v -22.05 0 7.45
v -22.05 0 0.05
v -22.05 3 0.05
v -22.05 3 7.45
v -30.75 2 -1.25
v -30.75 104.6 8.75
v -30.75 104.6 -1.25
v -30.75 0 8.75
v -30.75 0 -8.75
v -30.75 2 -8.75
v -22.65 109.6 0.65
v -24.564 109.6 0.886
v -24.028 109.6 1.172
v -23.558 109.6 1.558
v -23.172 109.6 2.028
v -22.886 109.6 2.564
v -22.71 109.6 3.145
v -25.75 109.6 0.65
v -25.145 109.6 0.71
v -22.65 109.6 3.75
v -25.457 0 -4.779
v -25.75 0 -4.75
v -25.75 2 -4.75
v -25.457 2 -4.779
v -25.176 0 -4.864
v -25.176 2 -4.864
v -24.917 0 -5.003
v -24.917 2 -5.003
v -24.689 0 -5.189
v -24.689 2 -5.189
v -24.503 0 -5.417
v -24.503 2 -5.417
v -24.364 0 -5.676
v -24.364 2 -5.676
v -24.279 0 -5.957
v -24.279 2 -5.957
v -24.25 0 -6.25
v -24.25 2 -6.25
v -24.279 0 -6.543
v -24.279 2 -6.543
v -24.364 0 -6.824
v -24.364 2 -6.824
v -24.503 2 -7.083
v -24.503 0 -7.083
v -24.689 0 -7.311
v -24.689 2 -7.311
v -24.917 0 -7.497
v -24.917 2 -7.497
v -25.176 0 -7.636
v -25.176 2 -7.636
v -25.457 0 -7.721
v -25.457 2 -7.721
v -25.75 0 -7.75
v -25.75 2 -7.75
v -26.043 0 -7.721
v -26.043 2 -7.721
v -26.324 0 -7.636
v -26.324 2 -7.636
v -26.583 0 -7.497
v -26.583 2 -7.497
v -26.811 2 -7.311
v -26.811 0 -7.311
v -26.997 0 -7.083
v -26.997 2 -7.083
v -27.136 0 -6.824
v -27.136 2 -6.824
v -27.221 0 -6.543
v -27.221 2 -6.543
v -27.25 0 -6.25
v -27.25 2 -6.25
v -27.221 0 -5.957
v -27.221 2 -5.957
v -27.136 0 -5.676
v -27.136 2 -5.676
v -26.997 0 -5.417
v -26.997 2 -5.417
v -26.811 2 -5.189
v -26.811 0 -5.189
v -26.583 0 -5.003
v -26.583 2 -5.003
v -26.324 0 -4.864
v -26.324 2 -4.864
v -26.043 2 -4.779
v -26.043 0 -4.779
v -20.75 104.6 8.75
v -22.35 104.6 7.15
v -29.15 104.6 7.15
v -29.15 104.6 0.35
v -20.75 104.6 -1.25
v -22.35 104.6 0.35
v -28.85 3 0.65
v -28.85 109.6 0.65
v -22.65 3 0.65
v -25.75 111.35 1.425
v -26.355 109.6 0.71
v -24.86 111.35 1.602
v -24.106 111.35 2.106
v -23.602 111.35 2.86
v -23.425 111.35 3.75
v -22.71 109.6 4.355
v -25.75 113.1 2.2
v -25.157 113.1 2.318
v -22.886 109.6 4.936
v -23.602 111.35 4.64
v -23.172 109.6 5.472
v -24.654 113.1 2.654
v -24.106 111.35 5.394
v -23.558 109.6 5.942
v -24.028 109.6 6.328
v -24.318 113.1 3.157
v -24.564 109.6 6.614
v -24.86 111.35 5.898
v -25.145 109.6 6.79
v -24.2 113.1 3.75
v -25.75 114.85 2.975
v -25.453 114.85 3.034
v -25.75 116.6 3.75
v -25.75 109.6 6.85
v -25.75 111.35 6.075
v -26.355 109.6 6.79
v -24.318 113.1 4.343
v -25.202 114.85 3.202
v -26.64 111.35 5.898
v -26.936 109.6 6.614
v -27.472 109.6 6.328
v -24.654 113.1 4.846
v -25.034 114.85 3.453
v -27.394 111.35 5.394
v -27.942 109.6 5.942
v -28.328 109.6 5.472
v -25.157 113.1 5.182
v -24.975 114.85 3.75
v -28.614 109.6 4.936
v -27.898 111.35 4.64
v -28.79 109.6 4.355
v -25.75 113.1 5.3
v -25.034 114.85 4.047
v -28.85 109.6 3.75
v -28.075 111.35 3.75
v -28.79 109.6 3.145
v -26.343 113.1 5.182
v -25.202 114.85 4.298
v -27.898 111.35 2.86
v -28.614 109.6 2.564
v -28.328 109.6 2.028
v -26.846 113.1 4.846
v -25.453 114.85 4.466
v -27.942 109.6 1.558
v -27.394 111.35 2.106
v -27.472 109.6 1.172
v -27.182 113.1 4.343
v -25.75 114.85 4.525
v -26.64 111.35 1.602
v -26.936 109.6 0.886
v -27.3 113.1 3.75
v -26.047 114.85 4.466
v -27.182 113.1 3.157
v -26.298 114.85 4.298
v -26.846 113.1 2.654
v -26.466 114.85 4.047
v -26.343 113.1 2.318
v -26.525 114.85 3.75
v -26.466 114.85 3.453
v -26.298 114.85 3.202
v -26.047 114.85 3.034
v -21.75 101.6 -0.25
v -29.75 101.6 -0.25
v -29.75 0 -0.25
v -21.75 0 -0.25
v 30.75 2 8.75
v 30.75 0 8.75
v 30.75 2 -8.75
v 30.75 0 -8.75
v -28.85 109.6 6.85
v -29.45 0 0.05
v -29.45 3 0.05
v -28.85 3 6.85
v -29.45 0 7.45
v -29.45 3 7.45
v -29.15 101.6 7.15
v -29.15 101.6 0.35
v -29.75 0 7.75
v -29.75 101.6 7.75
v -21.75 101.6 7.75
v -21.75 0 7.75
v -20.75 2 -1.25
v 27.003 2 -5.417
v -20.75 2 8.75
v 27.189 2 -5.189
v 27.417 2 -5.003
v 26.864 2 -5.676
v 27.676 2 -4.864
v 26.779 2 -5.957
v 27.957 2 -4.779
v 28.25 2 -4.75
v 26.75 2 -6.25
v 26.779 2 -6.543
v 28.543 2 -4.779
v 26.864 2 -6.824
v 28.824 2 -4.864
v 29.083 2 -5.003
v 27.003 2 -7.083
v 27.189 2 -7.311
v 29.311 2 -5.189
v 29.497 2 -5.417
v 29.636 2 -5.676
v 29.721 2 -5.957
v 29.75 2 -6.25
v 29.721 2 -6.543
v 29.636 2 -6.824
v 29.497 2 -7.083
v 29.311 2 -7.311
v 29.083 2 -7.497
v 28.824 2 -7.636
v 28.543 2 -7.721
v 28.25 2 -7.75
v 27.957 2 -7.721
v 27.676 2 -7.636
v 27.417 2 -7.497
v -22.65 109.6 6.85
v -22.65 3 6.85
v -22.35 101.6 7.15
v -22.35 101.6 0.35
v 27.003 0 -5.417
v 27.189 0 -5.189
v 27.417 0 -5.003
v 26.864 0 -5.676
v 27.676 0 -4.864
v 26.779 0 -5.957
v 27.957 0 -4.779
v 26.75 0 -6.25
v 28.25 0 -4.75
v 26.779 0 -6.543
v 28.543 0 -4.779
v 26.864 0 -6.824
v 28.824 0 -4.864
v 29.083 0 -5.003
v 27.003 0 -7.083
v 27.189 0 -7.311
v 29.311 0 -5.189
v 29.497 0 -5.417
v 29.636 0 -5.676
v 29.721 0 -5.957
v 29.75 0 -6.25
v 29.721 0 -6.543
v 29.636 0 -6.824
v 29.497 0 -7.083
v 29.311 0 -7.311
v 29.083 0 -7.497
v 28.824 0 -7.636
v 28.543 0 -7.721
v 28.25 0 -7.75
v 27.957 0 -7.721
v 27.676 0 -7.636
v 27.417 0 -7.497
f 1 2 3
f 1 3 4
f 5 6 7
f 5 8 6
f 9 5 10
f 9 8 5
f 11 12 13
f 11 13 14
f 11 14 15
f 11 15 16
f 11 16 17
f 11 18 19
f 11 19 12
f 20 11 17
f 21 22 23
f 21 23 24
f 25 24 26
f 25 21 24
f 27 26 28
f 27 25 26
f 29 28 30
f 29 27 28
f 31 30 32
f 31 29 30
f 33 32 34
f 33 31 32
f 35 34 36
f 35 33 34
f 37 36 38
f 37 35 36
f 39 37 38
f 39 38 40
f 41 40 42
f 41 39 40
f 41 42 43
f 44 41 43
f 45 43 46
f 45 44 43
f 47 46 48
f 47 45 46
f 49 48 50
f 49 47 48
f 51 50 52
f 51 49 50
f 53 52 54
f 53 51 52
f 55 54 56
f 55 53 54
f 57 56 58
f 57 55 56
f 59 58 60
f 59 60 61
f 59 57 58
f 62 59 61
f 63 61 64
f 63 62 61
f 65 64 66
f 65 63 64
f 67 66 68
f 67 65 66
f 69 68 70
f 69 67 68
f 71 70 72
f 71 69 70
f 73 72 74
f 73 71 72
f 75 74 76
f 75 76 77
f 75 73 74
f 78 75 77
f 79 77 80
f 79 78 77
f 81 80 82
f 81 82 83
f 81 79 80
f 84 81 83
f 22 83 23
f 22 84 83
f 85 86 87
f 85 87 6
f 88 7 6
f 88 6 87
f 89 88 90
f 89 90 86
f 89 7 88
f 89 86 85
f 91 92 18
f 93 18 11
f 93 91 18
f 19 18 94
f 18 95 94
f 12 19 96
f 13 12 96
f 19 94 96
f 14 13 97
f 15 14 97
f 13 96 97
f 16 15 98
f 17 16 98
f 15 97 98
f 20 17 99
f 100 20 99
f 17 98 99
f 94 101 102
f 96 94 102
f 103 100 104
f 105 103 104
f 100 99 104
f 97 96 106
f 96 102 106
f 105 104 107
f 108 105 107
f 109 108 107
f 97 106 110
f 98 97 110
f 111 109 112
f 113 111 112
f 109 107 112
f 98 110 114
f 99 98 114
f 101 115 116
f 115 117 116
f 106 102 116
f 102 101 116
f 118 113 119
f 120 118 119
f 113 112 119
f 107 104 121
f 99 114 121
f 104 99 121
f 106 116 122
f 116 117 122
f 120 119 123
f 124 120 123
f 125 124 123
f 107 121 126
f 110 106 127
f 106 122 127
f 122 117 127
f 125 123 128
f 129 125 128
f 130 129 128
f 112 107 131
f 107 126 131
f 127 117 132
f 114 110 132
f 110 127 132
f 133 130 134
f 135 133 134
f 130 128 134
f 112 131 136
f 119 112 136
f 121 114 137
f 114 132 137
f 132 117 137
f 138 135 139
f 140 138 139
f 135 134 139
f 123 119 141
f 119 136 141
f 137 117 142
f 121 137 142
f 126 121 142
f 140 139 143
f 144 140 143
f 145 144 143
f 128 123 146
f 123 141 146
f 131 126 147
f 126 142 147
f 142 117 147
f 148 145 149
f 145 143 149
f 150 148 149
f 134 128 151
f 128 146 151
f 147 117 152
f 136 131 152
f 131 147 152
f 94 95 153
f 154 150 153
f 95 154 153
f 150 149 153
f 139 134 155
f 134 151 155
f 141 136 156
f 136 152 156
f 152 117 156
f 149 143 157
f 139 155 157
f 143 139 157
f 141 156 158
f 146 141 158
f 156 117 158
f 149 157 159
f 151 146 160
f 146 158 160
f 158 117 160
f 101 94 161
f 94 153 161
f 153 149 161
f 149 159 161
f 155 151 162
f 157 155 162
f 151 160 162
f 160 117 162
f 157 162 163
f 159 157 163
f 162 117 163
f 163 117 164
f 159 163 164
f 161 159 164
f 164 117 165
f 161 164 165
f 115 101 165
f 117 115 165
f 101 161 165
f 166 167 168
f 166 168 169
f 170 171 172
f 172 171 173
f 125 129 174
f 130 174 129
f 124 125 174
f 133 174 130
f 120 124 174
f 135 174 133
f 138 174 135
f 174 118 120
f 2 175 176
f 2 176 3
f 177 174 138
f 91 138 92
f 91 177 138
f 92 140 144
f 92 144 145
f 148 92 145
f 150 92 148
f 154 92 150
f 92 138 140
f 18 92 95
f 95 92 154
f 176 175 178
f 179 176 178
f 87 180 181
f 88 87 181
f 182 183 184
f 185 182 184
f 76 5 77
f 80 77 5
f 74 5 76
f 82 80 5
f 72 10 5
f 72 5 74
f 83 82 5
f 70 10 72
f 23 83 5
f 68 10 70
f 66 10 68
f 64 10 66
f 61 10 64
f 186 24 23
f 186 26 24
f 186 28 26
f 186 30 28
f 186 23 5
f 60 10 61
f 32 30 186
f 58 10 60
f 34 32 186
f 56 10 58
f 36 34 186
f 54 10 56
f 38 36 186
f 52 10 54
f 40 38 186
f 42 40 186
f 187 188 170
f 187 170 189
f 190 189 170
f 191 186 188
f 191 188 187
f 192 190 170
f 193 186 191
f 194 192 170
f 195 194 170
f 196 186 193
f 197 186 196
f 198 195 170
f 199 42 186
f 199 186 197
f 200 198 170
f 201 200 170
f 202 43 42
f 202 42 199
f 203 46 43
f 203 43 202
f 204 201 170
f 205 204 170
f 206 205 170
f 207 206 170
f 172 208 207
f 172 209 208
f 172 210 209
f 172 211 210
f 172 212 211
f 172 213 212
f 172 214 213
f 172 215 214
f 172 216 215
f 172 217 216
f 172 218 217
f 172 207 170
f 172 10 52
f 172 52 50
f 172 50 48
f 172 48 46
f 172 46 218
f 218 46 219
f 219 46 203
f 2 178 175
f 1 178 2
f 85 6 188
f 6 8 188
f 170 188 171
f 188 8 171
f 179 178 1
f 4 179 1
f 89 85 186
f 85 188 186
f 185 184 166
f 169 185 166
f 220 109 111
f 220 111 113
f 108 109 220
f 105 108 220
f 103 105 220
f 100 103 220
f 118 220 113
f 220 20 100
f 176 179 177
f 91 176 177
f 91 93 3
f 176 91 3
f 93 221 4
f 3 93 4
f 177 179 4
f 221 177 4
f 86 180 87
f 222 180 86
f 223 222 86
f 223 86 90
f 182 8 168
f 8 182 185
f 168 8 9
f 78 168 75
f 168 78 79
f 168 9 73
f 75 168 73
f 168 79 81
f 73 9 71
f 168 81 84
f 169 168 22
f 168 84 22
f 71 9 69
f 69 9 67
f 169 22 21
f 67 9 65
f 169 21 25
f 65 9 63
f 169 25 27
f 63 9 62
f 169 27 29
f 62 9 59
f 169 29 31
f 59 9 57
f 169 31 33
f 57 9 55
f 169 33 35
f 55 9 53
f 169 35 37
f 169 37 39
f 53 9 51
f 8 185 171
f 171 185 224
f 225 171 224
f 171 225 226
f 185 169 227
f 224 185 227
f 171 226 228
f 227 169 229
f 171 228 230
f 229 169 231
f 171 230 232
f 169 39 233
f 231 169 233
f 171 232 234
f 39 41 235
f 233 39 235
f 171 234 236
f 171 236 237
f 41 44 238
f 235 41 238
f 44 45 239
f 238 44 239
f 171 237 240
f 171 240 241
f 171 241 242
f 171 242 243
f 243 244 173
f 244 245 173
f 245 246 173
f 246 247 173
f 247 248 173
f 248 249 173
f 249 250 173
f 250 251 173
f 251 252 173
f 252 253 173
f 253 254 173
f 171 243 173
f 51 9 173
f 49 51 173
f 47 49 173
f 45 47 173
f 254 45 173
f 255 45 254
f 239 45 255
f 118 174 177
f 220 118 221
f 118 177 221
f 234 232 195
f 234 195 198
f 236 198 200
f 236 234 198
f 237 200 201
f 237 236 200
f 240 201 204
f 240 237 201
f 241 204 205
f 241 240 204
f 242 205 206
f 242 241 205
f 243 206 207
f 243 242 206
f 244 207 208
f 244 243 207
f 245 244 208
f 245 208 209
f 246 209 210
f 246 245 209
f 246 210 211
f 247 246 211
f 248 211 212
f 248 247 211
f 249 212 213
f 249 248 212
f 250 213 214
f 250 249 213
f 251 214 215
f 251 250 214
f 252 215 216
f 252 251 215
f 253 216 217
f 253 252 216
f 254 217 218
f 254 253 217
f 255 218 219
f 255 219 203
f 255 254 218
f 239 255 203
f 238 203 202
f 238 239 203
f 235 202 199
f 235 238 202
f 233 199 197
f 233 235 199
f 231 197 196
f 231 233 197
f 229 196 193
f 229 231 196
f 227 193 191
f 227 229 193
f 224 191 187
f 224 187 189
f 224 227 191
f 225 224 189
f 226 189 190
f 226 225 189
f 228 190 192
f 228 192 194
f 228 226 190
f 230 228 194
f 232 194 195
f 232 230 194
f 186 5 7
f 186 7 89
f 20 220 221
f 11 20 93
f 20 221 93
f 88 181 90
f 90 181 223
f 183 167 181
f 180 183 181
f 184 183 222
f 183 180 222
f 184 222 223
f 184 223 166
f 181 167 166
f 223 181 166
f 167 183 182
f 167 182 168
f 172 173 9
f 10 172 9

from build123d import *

# Parameters (mm, degrees)
SKETCH1_R            = 1.5
SKETCH1_W            = 10
SKETCH1_H            = 10
SKETCH1_W_2          = 8
SKETCH1_H_2          = 8
BOSS_EXTRUDE5_DEPTH  = 2
SKETCH1_5_W          = 10
SKETCH1_5_H          = 10
SKETCH1_5_W_2        = 8
SKETCH1_5_H_2        = 8
BOSS_EXTRUDE6_DEPTH  = 101.6
SKETCH8_W            = 10
SKETCH8_H            = 10
SKETCH8_W_2          = 8
SKETCH8_H_2          = 8
SKETCH8_W_3          = 6.8
SKETCH8_H_3          = 6.8
BOSS_EXTRUDE11_DEPTH = 3
SKETCH9_W            = 7.4
SKETCH9_H            = 7.4
BOSS_EXTRUDE12_DEPTH = 3
SKETCH10_W           = 6.2
SKETCH10_H           = 6.2
BOSS_EXTRUDE13_DEPTH = 106.6


with BuildPart() as part:
    # Sketch1 → Boss-Extrude5 (new body)
    # profile 1 of 2: a face of its own
    with BuildSketch(Plane(origin=(0, 0, 0), x_dir=(1, 0, 0), z_dir=(0, 1, 0))):
        Polygon((-20.75, -8.75), (30.75, -8.75), (30.75, 8.75), (-30.75, 8.75), (-30.75, 1.25), (-20.75, 1.25), align=None)
        with Locations(Location((-25.75, 6.25, 0), (0, 0, 270))):
            Circle(SKETCH1_R, mode=Mode.SUBTRACT)
        with Locations(Location((28.25, 6.25, 0), (0, 0, 270))):
            Circle(SKETCH1_R, mode=Mode.SUBTRACT)
    # profile 2 of 2: a face of its own
    with BuildSketch(Plane(origin=(0, 0, 0), x_dir=(1, 0, 0), z_dir=(0, 1, 0))):
        with Locations((-25.75, -3.75)):
            Rectangle(SKETCH1_W, SKETCH1_H)
        with Locations((-25.75, -3.75)):
            Rectangle(SKETCH1_W_2, SKETCH1_H_2, mode=Mode.SUBTRACT)
    extrude(amount=BOSS_EXTRUDE5_DEPTH)

    # Sketch1<5> → Boss-Extrude6 (add)
    with BuildSketch(Plane(origin=(0, 0, 0), x_dir=(1, 0, 0), z_dir=(0, 1, 0))):
        with Locations((-25.75, -3.75)):
            Rectangle(SKETCH1_5_W, SKETCH1_5_H)
        with Locations((-25.75, -3.75)):
            Rectangle(SKETCH1_5_W_2, SKETCH1_5_H_2, mode=Mode.SUBTRACT)
    extrude(amount=BOSS_EXTRUDE6_DEPTH)

    # Sketch8 → Boss-Extrude11 (add)
    # profile 1 of 2: a face of its own
    with BuildSketch(Plane(origin=(0, 101.6, 0), x_dir=(1, 0, 0), z_dir=(0, 1, 0))):
        with Locations((-25.75, -3.75)):
            Rectangle(SKETCH8_W, SKETCH8_H)
        with Locations((-25.75, -3.75)):
            Rectangle(SKETCH8_W_2, SKETCH8_H_2, mode=Mode.SUBTRACT)
    # profile 2 of 2: a face of its own
    with BuildSketch(Plane(origin=(0, 101.6, 0), x_dir=(1, 0, 0), z_dir=(0, 1, 0))):
        with Locations((-25.75, -3.75)):
            Rectangle(SKETCH8_W_2, SKETCH8_H_2)
        with Locations((-25.75, -3.75)):
            Rectangle(SKETCH8_W_3, SKETCH8_H_3, mode=Mode.SUBTRACT)
    extrude(amount=BOSS_EXTRUDE11_DEPTH)


with BuildPart() as body_2:
    # Sketch9 → Boss-Extrude12 (new body)
    with BuildSketch(Plane.XZ):
        with Locations((-25.75, 3.75)):
            Rectangle(SKETCH9_W, SKETCH9_H)
    extrude(amount=-BOSS_EXTRUDE12_DEPTH)

    # Sketch10 → Boss-Extrude13 (add)
    with BuildSketch(Plane(origin=(0, 3, 0), x_dir=(1, 0, 0), z_dir=(0, 1, 0))):
        with Locations((-25.75, -3.75)):
            Rectangle(SKETCH10_W, SKETCH10_H)
    extrude(amount=BOSS_EXTRUDE13_DEPTH)

    # Sketch11 → Revolve2 (revolve)
    with BuildSketch(Plane(origin=(0, 0, 3.75), x_dir=(-1, 0, 0), z_dir=(0, 0, -1)), mode=Mode.PRIVATE) as revolve2_sk:
        Polygon((28.85, 109.6), (25.75, 116.6), (25.75, 109.6), align=None)
    revolve(revolve2_sk.sketch.rotate(Axis((-25.75, 116.6, 3.75), (0, -1, 0)), 90), axis=Axis((-25.75, 116.6, 3.75), (0, -1, 0)))


solid = Compound([part.part, body_2.part])
